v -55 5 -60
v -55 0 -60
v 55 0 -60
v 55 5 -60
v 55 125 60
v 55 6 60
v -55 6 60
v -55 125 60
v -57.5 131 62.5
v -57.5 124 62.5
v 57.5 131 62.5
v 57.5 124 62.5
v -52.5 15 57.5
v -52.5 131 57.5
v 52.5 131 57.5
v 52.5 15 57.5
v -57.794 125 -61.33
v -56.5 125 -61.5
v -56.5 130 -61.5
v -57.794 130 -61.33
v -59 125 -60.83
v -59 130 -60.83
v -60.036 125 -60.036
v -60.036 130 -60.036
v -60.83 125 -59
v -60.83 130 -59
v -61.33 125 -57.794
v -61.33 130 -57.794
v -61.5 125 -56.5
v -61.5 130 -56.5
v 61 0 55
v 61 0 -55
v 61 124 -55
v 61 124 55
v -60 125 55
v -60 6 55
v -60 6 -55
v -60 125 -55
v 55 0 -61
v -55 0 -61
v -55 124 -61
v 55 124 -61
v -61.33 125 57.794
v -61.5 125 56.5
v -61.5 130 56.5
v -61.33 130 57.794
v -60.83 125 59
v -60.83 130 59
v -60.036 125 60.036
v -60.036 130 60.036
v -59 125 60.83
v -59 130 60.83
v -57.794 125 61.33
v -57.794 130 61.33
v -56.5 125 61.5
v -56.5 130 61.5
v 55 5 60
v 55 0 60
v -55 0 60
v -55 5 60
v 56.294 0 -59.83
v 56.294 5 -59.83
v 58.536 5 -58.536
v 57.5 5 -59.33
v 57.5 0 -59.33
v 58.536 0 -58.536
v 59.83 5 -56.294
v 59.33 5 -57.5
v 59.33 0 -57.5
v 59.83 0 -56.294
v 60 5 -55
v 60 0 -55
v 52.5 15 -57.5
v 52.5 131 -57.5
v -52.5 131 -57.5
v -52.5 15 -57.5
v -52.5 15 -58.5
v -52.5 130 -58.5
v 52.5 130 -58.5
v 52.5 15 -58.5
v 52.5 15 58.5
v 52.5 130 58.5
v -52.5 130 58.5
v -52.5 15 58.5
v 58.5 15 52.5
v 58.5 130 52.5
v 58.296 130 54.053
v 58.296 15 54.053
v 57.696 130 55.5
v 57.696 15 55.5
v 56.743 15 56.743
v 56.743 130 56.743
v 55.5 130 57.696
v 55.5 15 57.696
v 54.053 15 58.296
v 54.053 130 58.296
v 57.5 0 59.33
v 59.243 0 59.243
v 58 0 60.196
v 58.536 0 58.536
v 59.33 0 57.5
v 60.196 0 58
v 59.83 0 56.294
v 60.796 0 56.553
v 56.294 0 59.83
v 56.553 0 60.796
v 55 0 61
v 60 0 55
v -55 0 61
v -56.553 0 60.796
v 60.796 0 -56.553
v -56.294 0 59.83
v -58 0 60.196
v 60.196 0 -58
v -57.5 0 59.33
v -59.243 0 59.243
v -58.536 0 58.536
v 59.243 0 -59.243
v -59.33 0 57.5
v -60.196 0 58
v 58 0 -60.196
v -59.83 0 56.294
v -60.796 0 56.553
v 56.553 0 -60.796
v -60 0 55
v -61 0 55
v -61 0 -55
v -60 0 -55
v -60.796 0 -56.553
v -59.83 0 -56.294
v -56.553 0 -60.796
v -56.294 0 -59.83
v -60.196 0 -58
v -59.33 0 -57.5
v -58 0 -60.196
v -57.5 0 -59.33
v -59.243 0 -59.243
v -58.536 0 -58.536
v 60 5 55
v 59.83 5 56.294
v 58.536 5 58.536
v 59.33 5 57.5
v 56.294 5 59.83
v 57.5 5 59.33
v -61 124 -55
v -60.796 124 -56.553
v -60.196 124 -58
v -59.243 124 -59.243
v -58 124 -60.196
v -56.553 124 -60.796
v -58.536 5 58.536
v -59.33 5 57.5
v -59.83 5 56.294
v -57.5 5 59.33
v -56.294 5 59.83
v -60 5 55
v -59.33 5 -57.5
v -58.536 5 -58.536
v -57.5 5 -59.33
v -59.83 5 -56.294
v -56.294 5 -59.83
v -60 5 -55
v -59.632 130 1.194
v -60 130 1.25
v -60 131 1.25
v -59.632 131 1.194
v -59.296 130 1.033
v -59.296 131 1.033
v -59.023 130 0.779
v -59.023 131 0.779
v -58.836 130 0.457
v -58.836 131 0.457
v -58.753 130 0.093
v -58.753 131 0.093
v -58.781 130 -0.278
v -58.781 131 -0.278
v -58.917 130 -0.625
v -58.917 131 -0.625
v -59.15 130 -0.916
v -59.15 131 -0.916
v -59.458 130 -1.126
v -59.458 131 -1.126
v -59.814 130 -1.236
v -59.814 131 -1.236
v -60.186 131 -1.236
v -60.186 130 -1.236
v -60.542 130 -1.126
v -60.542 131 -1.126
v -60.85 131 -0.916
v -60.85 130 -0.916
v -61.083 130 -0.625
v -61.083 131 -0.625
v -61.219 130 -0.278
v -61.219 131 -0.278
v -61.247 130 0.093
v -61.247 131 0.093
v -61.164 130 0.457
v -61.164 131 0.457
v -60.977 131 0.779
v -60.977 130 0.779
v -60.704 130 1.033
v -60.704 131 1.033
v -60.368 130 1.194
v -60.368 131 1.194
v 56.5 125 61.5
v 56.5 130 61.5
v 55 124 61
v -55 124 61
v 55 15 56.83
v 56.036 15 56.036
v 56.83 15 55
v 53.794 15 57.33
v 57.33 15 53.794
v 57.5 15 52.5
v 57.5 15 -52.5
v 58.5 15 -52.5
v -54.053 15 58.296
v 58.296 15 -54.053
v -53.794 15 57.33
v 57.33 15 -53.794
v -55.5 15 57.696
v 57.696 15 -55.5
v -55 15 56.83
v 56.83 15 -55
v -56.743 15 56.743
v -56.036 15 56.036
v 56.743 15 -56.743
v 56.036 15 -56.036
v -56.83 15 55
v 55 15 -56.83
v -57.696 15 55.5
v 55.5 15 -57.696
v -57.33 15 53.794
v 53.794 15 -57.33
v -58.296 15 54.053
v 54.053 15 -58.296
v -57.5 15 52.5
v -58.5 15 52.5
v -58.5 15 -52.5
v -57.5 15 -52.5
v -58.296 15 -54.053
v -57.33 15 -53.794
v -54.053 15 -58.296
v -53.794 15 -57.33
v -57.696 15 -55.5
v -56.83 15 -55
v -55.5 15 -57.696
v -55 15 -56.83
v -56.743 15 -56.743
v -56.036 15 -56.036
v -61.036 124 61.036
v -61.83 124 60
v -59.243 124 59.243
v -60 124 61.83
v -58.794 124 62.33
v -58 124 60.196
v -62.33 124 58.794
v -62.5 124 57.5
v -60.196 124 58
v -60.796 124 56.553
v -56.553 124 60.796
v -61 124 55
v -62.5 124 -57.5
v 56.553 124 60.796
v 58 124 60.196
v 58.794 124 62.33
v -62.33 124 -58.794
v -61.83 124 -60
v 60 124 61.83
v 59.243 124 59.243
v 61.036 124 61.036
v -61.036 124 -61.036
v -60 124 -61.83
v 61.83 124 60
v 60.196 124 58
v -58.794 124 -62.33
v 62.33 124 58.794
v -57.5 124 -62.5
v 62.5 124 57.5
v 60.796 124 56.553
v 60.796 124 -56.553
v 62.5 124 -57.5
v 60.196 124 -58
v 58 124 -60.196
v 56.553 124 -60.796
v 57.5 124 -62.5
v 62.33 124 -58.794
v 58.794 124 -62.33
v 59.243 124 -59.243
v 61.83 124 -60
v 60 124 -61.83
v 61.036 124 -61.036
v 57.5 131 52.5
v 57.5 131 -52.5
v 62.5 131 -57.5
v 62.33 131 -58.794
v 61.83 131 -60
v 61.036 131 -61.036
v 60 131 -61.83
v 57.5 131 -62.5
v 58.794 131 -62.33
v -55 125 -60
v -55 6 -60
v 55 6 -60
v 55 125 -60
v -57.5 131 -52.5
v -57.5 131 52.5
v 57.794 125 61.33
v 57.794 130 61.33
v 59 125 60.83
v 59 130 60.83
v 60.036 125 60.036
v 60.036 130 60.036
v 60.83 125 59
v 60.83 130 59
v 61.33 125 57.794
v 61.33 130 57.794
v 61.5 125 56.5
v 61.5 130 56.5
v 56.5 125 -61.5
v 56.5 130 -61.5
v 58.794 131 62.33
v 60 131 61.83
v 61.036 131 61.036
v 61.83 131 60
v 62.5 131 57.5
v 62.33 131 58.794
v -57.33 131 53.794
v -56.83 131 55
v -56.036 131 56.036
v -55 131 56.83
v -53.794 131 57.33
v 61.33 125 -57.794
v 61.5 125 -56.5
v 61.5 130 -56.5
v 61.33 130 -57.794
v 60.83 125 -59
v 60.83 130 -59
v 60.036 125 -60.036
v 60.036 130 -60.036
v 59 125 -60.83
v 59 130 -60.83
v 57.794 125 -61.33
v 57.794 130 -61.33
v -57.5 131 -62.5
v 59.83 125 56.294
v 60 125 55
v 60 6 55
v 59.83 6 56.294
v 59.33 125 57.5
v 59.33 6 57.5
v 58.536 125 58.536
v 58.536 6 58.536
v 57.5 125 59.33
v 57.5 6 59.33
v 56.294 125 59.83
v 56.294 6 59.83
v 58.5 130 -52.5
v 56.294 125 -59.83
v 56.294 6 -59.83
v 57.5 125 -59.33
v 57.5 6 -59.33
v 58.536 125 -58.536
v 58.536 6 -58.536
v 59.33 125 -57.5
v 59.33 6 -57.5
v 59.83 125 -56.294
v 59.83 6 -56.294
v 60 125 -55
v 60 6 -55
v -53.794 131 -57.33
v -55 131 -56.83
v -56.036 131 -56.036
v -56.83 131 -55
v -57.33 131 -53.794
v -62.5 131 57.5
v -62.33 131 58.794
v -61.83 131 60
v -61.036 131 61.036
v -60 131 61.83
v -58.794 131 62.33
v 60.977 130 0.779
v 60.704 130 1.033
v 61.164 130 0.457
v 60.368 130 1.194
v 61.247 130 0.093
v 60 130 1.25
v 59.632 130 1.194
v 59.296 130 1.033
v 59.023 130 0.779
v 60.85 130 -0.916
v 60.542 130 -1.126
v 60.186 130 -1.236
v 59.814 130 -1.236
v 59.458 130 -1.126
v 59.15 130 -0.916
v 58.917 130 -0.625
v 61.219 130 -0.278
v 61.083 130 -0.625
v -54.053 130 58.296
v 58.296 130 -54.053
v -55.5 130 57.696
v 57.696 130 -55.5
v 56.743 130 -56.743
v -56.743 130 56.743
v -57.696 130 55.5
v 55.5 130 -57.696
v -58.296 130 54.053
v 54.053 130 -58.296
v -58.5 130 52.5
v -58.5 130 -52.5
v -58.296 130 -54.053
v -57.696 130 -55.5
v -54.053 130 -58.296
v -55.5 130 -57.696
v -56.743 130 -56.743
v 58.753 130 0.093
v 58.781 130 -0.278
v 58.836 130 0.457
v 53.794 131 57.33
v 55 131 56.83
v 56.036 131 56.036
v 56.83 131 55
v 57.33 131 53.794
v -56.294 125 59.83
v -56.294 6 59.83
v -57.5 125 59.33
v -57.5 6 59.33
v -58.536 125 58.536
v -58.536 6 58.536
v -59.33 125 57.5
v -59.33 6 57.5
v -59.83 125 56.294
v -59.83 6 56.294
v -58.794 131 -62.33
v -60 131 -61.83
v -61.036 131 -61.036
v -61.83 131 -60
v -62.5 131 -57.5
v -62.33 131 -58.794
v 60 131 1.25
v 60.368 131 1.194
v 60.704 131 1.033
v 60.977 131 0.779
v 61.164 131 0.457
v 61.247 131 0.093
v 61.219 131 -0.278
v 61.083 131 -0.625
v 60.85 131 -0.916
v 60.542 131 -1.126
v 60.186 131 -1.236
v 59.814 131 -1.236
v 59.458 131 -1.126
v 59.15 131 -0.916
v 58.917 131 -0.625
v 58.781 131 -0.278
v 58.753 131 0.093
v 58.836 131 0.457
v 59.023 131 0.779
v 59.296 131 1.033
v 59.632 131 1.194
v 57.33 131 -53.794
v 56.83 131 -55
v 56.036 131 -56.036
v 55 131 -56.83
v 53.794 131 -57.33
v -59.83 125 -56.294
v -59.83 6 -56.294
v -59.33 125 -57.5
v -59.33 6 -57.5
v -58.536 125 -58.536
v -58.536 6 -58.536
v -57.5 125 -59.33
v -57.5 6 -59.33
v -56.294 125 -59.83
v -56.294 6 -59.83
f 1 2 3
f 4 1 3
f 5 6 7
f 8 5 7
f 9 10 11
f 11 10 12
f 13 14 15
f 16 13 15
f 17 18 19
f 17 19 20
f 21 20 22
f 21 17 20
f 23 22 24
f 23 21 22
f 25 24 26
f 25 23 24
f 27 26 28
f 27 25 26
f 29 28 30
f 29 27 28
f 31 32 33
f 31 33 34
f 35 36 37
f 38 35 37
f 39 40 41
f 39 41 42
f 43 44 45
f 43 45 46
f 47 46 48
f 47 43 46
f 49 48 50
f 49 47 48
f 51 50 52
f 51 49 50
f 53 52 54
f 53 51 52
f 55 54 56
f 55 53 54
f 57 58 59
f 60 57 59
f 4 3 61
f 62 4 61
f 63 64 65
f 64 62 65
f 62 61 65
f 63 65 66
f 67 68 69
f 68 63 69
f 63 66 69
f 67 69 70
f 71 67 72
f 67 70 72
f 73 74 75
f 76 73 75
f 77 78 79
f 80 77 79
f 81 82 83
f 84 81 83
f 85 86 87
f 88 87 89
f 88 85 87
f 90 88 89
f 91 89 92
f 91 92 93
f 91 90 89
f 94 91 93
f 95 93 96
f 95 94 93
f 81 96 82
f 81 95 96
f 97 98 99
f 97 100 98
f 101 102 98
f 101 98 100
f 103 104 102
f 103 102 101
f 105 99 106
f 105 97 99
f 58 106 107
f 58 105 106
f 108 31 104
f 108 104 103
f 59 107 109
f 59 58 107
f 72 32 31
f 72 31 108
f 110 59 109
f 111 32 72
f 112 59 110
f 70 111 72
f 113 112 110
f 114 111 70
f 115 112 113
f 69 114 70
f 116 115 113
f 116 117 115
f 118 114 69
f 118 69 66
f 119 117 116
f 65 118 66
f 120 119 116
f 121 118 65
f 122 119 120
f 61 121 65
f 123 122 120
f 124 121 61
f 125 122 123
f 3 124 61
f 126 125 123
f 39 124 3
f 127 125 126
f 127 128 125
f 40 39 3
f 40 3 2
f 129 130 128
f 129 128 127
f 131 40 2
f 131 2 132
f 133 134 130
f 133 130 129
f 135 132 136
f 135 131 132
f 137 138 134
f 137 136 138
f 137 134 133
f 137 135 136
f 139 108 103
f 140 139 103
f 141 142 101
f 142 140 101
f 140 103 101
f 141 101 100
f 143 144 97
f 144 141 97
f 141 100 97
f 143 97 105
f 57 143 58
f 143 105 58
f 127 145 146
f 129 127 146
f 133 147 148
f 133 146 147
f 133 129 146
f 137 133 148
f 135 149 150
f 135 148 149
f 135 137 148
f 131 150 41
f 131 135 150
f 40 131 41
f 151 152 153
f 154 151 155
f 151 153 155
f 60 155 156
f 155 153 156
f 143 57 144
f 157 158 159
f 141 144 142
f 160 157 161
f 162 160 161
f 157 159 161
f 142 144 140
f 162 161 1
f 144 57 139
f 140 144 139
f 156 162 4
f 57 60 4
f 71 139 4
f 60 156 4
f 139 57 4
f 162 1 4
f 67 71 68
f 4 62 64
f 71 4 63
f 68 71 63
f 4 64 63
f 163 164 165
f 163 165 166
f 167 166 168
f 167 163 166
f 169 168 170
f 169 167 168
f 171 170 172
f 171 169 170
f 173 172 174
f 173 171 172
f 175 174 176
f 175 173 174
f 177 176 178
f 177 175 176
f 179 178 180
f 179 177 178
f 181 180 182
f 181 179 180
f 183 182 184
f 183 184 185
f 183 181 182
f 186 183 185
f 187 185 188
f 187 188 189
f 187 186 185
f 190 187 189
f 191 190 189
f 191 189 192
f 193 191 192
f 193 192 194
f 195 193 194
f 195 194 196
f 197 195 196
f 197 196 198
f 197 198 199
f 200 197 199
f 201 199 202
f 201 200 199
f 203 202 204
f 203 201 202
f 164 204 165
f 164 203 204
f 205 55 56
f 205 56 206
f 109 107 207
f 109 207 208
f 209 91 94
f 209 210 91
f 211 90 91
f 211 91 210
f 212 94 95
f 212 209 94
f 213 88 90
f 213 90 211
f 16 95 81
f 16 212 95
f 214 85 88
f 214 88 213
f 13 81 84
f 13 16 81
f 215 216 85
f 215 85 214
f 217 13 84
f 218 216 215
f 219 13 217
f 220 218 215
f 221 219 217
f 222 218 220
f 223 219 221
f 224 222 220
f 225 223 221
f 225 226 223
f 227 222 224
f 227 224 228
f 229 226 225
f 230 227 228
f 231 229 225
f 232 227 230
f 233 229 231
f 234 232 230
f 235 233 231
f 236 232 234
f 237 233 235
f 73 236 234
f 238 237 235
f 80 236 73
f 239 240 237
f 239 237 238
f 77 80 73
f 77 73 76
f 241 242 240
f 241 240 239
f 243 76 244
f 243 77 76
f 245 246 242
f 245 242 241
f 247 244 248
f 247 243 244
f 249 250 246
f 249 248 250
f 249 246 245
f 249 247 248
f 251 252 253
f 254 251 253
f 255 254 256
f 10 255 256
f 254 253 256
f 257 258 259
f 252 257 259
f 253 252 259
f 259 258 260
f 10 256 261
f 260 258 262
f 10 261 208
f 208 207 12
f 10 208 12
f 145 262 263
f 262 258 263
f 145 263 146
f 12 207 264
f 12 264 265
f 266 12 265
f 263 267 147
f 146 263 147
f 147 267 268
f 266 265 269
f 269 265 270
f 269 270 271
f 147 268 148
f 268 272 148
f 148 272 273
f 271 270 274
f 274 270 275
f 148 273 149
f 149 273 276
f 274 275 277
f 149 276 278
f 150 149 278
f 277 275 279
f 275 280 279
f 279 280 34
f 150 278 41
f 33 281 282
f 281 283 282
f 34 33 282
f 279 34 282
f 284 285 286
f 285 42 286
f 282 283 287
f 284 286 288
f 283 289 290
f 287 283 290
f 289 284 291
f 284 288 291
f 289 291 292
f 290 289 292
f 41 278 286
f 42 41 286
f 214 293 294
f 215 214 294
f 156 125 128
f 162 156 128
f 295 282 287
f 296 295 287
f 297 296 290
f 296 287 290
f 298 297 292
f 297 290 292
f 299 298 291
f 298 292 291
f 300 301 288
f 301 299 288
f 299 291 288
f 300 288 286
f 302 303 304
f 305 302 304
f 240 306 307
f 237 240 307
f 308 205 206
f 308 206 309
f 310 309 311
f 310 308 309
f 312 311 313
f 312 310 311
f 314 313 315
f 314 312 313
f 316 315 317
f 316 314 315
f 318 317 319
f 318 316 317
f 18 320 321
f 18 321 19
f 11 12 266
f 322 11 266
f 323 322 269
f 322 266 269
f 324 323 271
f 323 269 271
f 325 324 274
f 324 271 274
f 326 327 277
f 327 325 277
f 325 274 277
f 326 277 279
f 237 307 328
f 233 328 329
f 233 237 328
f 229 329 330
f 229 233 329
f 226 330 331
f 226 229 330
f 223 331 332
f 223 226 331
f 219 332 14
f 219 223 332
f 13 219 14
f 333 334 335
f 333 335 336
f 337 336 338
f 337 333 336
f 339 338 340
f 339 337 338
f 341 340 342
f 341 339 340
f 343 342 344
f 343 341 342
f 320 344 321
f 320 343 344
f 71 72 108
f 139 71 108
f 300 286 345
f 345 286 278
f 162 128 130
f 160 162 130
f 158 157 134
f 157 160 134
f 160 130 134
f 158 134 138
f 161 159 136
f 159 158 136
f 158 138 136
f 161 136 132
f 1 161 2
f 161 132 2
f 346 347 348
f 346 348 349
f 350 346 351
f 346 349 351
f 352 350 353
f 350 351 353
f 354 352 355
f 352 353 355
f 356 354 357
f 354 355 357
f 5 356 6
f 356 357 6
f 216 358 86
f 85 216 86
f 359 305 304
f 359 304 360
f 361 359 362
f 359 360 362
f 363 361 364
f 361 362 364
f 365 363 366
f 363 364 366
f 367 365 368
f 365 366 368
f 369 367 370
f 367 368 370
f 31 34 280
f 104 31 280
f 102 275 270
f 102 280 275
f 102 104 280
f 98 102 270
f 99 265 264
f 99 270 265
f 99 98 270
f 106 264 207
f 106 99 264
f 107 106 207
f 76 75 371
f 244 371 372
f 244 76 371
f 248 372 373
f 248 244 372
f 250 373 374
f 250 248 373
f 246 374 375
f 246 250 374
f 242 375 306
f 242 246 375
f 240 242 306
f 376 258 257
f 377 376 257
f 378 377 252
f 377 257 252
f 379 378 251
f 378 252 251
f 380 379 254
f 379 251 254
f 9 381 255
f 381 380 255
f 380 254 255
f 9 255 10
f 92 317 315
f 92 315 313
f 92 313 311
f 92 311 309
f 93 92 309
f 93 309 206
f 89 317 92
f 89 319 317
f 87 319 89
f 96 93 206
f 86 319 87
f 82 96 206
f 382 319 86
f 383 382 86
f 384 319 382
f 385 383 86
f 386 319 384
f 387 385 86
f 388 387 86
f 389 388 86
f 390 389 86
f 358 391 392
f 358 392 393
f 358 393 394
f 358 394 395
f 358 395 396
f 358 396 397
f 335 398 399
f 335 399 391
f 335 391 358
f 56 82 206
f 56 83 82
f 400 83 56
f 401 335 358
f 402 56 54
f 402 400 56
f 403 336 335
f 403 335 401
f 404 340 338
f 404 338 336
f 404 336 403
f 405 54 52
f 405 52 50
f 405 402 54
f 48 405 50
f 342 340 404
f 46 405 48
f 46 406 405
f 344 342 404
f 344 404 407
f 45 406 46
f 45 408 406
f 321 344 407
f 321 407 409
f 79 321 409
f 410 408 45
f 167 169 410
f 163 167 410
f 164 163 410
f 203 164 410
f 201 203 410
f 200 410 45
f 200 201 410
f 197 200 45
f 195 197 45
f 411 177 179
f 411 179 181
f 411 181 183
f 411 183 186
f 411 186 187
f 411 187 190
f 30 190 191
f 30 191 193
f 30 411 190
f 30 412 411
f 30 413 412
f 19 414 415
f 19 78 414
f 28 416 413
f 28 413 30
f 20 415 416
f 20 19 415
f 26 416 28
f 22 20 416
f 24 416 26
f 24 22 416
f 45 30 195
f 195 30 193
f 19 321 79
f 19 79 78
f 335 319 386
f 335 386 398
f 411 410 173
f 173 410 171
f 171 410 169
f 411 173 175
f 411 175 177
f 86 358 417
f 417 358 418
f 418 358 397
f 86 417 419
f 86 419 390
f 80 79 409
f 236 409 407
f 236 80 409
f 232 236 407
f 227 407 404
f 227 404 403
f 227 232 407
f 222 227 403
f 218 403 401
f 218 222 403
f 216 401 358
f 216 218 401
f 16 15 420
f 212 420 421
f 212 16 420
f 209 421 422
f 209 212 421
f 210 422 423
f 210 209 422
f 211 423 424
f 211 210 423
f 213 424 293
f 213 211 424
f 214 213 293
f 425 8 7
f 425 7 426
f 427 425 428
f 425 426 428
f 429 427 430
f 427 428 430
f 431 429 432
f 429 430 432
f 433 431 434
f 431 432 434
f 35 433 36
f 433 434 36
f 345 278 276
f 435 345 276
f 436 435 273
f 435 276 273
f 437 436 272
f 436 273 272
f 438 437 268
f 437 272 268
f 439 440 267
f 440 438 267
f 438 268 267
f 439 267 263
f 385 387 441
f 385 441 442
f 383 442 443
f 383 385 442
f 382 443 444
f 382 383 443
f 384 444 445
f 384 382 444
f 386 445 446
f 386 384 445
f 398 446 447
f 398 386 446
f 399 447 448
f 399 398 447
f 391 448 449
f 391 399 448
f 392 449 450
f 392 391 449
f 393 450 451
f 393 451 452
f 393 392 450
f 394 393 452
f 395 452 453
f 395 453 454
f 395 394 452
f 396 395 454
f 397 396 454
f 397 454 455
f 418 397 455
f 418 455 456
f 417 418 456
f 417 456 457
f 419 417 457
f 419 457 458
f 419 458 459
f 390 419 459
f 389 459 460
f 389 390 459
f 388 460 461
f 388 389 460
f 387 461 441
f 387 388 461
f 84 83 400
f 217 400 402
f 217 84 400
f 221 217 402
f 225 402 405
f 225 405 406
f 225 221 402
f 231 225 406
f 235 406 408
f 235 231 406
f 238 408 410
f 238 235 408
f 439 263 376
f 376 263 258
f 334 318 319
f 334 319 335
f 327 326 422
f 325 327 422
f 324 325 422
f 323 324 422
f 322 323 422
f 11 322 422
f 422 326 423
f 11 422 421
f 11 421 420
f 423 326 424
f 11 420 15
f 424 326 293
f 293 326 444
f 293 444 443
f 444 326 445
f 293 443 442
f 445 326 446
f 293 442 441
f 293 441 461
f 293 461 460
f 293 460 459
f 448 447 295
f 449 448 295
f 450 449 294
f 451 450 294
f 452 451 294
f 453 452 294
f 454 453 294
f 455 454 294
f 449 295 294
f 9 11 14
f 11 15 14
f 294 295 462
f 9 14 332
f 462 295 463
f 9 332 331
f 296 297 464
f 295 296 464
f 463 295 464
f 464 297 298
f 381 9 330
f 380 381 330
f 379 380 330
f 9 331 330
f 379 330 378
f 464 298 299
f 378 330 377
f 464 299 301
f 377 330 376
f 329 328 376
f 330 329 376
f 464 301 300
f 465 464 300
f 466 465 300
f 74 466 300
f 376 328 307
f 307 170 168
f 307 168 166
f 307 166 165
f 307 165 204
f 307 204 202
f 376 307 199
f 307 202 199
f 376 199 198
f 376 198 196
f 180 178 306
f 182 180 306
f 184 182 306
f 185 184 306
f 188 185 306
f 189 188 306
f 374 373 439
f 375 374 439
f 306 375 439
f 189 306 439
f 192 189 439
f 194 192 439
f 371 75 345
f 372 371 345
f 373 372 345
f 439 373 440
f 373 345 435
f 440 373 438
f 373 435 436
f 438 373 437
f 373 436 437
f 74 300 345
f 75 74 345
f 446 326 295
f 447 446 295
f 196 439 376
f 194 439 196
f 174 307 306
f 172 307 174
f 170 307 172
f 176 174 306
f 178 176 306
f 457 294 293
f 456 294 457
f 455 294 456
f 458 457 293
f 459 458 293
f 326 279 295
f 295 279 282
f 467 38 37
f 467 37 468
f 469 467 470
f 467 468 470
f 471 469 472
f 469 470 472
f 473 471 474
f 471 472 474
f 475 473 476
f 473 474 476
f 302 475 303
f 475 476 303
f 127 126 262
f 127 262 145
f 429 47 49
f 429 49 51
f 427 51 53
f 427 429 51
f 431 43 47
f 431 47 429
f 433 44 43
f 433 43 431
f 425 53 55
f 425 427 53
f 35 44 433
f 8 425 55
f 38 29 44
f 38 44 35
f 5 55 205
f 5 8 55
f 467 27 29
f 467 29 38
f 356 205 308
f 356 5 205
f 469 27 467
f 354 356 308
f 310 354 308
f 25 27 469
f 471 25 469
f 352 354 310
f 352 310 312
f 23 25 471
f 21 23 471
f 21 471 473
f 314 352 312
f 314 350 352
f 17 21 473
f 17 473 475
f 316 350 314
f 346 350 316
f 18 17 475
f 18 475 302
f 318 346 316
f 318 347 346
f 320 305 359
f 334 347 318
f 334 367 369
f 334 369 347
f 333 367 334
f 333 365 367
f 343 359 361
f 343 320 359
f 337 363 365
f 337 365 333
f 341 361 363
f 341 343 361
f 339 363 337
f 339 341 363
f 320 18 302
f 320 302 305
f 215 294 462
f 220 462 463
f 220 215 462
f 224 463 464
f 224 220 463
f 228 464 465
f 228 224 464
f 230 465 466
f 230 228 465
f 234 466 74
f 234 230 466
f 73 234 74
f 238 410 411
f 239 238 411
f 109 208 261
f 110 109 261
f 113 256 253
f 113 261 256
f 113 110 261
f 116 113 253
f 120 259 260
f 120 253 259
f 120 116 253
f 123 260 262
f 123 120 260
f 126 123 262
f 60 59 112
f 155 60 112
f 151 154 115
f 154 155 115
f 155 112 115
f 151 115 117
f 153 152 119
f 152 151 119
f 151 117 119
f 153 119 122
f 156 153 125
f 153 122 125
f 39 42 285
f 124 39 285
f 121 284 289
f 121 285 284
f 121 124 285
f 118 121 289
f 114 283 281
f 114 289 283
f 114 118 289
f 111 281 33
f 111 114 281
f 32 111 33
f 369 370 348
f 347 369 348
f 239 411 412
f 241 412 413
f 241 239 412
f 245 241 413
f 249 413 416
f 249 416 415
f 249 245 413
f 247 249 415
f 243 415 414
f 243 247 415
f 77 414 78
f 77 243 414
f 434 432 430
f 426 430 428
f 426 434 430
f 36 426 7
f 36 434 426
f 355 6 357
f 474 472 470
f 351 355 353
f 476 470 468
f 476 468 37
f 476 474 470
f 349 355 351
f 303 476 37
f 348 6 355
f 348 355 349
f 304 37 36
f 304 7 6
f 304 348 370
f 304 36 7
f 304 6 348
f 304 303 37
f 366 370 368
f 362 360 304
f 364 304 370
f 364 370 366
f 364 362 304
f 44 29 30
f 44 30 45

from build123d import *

# Parameters (mm, degrees)
EXTRUDE_1_DEPTH   = 125
EXTRUDE_1_2_DEPTH = 1
EXTRUDE_2_DEPTH   = 115
SKETCH_5_R        = 1.25
EXTRUDE_3_DEPTH   = 1
EXTRUDE_4_REACH   = 155.093
EXTRUDE_START     = -1
EXTRUDE_5_DEPTH   = 1


with BuildPart() as part:
    # 草图1 → Extrude 1 (new body)
    with BuildSketch(Plane(origin=(0, 0, 0), x_dir=(1, 0, 0), z_dir=(0, 1, 0))):
        with BuildLine():
            Line((55, -61), (-55, -61))
            ThreePointArc((-55, -61), (-59.242640687, -59.242640687), (-61, -55))
            Line((-61, -55), (-61, 55))
            ThreePointArc((-61, 55), (-59.242640687, 59.242640687), (-55, 61))
            Line((-55, 61), (55, 61))
            ThreePointArc((55, 61), (59.242640687, 59.242640687), (61, 55))
            Line((61, 55), (61, -55))
            ThreePointArc((61, -55), (59.242640687, -59.242640687), (55, -61))
        make_face()
        with BuildLine():
            Line((55, -60), (-55, -60))
            ThreePointArc((-55, -60), (-58.535533906, -58.535533906), (-60, -55))
            Line((-60, -55), (-60, 55))
            ThreePointArc((-60, 55), (-58.535533906, 58.535533906), (-55, 60))
            Line((-55, 60), (55, 60))
            ThreePointArc((55, 60), (58.535533906, 58.535533906), (60, 55))
            Line((60, 55), (60, -55))
            ThreePointArc((60, -55), (58.535533906, -58.535533906), (55, -60))
        make_face(mode=Mode.SUBTRACT)
    extrude(amount=EXTRUDE_1_DEPTH)

    # 草图2 → Extrude 1 2 (add)
    with BuildSketch(Plane(origin=(0, 5, 0), x_dir=(1, 0, 0), z_dir=(0, 1, 0))):
        with BuildLine():
            Line((-60, 55), (-60, -55))
            ThreePointArc((-60, -55), (-58.535533906, -58.535533906), (-55, -60))
            Line((-55, -60), (55, -60))
            ThreePointArc((55, -60), (58.535533906, -58.535533906), (60, -55))
            Line((60, -55), (60, 55))
            ThreePointArc((60, 55), (58.535533906, 58.535533906), (55, 60))
            Line((55, 60), (-55, 60))
            ThreePointArc((-55, 60), (-58.535533906, 58.535533906), (-60, 55))
        make_face()
    extrude(amount=EXTRUDE_1_2_DEPTH)



with BuildPart() as body_2:
    # 草图4 → 拉伸-薄壁2 (new body)
    with BuildSketch(Plane(origin=(0, 15, 0), x_dir=(1, 0, 0), z_dir=(0, 1, 0))):
        with BuildLine():
            Line((-52.5, 58.5), (52.5, 58.5))
            ThreePointArc((52.5, 58.5), (56.742640687, 56.742640687), (58.5, 52.5))
            Line((58.5, 52.5), (58.5, -52.5))
            ThreePointArc((58.5, -52.5), (56.742640687, -56.742640687), (52.5, -58.5))
            Line((52.5, -58.5), (-52.5, -58.5))
            ThreePointArc((-52.5, -58.5), (-56.742640687, -56.742640687), (-58.5, -52.5))
            Line((-58.5, -52.5), (-58.5, 52.5))
            ThreePointArc((-58.5, 52.5), (-56.742640687, 56.742640687), (-52.5, 58.5))
        make_face()
        with BuildLine():
            Line((-52.5, 57.5), (52.5, 57.5))
            ThreePointArc((52.5, 57.5), (56.035533906, 56.035533906), (57.5, 52.5))
            Line((57.5, 52.5), (57.5, -52.5))
            ThreePointArc((57.5, -52.5), (56.035533906, -56.035533906), (52.5, -57.5))
            Line((52.5, -57.5), (-52.5, -57.5))
            ThreePointArc((-52.5, -57.5), (-56.035533906, -56.035533906), (-57.5, -52.5))
            Line((-57.5, -52.5), (-57.5, 52.5))
            ThreePointArc((-57.5, 52.5), (-56.035533906, 56.035533906), (-52.5, 57.5))
        make_face(mode=Mode.SUBTRACT)
    extrude(amount=EXTRUDE_2_DEPTH)

    # 草图5 → 凸台-拉伸3 (add)
    with BuildSketch(Plane(origin=(0, 130, 0), x_dir=(1, 0, 0), z_dir=(0, 1, 0))):
        with BuildLine():
            Line((-57.5, 62.5), (57.5, 62.5))
            ThreePointArc((57.5, 62.5), (61.035533906, 61.035533906), (62.5, 57.5))
            Line((62.5, 57.5), (62.5, -57.5))
            ThreePointArc((62.5, -57.5), (61.035533906, -61.035533906), (57.5, -62.5))
            Line((57.5, -62.5), (-57.5, -62.5))
            ThreePointArc((-57.5, -62.5), (-61.035533906, -61.035533906), (-62.5, -57.5))
            Line((-62.5, -57.5), (-62.5, 57.5))
            ThreePointArc((-62.5, 57.5), (-61.035533906, 61.035533906), (-57.5, 62.5))
        make_face()
        with Locations(Location((-60, 0, 0), (0, 0, 270))):
            Circle(SKETCH_5_R, mode=Mode.SUBTRACT)
        with Locations(Location((60, 0, 0), (0, 0, 270))):
            Circle(SKETCH_5_R, mode=Mode.SUBTRACT)
        with BuildLine():
            Line((-57.5, 52.5), (-57.5, -52.5))
            ThreePointArc((-57.5, -52.5), (-56.035533906, -56.035533906), (-52.5, -57.5))
            Line((-52.5, -57.5), (52.5, -57.5))
            ThreePointArc((52.5, -57.5), (56.035533906, -56.035533906), (57.5, -52.5))
            Line((57.5, -52.5), (57.5, 52.5))
            ThreePointArc((57.5, 52.5), (56.035533906, 56.035533906), (52.5, 57.5))
            Line((52.5, 57.5), (-52.5, 57.5))
            ThreePointArc((-52.5, 57.5), (-56.035533906, 56.035533906), (-57.5, 52.5))
        make_face(mode=Mode.SUBTRACT)
    extrude(amount=EXTRUDE_3_DEPTH)

    # 草图7 → 凸台-拉伸4 (add, up to next)
    with BuildSketch(Plane(origin=(0, 125, 0), x_dir=(1, 0, 0), z_dir=(0, 1, 0)), mode=Mode.PRIVATE) as extrude_4_sk1:
        with BuildLine():
            Line((62.5, -57.5), (62.5, 57.5))
            ThreePointArc((62.5, 57.5), (61.035533906, 61.035533906), (57.5, 62.5))
            Line((57.5, 62.5), (-57.5, 62.5))
            ThreePointArc((-57.5, 62.5), (-61.035533906, 61.035533906), (-62.5, 57.5))
            Line((-62.5, 57.5), (-62.5, -57.5))
            ThreePointArc((-62.5, -57.5), (-61.035533906, -61.035533906), (-57.5, -62.5))
            Line((-57.5, -62.5), (57.5, -62.5))
            ThreePointArc((57.5, -62.5), (61.035533906, -61.035533906), (62.5, -57.5))
        make_face()
        with BuildLine():
            Line((-56.5, -61.5), (56.5, -61.5))
            ThreePointArc((56.5, -61.5), (60.035533906, -60.035533906), (61.5, -56.5))
            Line((61.5, -56.5), (61.5, 56.5))
            ThreePointArc((61.5, 56.5), (60.035533906, 60.035533906), (56.5, 61.5))
            Line((56.5, 61.5), (-56.5, 61.5))
            ThreePointArc((-56.5, 61.5), (-60.035533906, 60.035533906), (-61.5, 56.5))
            Line((-61.5, 56.5), (-61.5, -56.5))
            ThreePointArc((-61.5, -56.5), (-60.035533906, -60.035533906), (-56.5, -61.5))
        make_face(mode=Mode.SUBTRACT)
    extrude_4_tool1 = extrude(extrude_4_sk1.sketch, amount=EXTRUDE_4_REACH, mode=Mode.PRIVATE) - body_2.part
    add(extrude_4_tool1.solids().sort_by_distance((60.910534, 125, 60.910534))[0])


with BuildPart() as part_1:
    add(part.part)

    add(body_2.part)  # 凸台-拉伸5 merges body 2
    # 草图8 → 凸台-拉伸5 (add)
    with BuildSketch(Plane(origin=(0, 125, 0), x_dir=(1, 0, 0), z_dir=(0, 1, 0)).offset(EXTRUDE_START)):
        with BuildLine():
            Line((-62.5, 57.5), (-62.5, -57.5))
            ThreePointArc((-62.5, -57.5), (-61.035533906, -61.035533906), (-57.5, -62.5))
            Line((-57.5, -62.5), (57.5, -62.5))
            ThreePointArc((57.5, -62.5), (61.035533906, -61.035533906), (62.5, -57.5))
            Line((62.5, -57.5), (62.5, 57.5))
            ThreePointArc((62.5, 57.5), (61.035533906, 61.035533906), (57.5, 62.5))
            Line((57.5, 62.5), (-57.5, 62.5))
            ThreePointArc((-57.5, 62.5), (-61.035533906, 61.035533906), (-62.5, 57.5))
        make_face()
        with BuildLine():
            Line((55, 61), (-55, 61))
            ThreePointArc((-55, 61), (-59.242640687, 59.242640687), (-61, 55))
            Line((-61, 55), (-61, -55))
            ThreePointArc((-61, -55), (-59.242640687, -59.242640687), (-55, -61))
            Line((-55, -61), (55, -61))
            ThreePointArc((55, -61), (59.242640687, -59.242640687), (61, -55))
            Line((61, -55), (61, 55))
            ThreePointArc((61, 55), (59.242640687, 59.242640687), (55, 61))
        make_face(mode=Mode.SUBTRACT)
    extrude(amount=EXTRUDE_5_DEPTH)


solid = part_1.part
